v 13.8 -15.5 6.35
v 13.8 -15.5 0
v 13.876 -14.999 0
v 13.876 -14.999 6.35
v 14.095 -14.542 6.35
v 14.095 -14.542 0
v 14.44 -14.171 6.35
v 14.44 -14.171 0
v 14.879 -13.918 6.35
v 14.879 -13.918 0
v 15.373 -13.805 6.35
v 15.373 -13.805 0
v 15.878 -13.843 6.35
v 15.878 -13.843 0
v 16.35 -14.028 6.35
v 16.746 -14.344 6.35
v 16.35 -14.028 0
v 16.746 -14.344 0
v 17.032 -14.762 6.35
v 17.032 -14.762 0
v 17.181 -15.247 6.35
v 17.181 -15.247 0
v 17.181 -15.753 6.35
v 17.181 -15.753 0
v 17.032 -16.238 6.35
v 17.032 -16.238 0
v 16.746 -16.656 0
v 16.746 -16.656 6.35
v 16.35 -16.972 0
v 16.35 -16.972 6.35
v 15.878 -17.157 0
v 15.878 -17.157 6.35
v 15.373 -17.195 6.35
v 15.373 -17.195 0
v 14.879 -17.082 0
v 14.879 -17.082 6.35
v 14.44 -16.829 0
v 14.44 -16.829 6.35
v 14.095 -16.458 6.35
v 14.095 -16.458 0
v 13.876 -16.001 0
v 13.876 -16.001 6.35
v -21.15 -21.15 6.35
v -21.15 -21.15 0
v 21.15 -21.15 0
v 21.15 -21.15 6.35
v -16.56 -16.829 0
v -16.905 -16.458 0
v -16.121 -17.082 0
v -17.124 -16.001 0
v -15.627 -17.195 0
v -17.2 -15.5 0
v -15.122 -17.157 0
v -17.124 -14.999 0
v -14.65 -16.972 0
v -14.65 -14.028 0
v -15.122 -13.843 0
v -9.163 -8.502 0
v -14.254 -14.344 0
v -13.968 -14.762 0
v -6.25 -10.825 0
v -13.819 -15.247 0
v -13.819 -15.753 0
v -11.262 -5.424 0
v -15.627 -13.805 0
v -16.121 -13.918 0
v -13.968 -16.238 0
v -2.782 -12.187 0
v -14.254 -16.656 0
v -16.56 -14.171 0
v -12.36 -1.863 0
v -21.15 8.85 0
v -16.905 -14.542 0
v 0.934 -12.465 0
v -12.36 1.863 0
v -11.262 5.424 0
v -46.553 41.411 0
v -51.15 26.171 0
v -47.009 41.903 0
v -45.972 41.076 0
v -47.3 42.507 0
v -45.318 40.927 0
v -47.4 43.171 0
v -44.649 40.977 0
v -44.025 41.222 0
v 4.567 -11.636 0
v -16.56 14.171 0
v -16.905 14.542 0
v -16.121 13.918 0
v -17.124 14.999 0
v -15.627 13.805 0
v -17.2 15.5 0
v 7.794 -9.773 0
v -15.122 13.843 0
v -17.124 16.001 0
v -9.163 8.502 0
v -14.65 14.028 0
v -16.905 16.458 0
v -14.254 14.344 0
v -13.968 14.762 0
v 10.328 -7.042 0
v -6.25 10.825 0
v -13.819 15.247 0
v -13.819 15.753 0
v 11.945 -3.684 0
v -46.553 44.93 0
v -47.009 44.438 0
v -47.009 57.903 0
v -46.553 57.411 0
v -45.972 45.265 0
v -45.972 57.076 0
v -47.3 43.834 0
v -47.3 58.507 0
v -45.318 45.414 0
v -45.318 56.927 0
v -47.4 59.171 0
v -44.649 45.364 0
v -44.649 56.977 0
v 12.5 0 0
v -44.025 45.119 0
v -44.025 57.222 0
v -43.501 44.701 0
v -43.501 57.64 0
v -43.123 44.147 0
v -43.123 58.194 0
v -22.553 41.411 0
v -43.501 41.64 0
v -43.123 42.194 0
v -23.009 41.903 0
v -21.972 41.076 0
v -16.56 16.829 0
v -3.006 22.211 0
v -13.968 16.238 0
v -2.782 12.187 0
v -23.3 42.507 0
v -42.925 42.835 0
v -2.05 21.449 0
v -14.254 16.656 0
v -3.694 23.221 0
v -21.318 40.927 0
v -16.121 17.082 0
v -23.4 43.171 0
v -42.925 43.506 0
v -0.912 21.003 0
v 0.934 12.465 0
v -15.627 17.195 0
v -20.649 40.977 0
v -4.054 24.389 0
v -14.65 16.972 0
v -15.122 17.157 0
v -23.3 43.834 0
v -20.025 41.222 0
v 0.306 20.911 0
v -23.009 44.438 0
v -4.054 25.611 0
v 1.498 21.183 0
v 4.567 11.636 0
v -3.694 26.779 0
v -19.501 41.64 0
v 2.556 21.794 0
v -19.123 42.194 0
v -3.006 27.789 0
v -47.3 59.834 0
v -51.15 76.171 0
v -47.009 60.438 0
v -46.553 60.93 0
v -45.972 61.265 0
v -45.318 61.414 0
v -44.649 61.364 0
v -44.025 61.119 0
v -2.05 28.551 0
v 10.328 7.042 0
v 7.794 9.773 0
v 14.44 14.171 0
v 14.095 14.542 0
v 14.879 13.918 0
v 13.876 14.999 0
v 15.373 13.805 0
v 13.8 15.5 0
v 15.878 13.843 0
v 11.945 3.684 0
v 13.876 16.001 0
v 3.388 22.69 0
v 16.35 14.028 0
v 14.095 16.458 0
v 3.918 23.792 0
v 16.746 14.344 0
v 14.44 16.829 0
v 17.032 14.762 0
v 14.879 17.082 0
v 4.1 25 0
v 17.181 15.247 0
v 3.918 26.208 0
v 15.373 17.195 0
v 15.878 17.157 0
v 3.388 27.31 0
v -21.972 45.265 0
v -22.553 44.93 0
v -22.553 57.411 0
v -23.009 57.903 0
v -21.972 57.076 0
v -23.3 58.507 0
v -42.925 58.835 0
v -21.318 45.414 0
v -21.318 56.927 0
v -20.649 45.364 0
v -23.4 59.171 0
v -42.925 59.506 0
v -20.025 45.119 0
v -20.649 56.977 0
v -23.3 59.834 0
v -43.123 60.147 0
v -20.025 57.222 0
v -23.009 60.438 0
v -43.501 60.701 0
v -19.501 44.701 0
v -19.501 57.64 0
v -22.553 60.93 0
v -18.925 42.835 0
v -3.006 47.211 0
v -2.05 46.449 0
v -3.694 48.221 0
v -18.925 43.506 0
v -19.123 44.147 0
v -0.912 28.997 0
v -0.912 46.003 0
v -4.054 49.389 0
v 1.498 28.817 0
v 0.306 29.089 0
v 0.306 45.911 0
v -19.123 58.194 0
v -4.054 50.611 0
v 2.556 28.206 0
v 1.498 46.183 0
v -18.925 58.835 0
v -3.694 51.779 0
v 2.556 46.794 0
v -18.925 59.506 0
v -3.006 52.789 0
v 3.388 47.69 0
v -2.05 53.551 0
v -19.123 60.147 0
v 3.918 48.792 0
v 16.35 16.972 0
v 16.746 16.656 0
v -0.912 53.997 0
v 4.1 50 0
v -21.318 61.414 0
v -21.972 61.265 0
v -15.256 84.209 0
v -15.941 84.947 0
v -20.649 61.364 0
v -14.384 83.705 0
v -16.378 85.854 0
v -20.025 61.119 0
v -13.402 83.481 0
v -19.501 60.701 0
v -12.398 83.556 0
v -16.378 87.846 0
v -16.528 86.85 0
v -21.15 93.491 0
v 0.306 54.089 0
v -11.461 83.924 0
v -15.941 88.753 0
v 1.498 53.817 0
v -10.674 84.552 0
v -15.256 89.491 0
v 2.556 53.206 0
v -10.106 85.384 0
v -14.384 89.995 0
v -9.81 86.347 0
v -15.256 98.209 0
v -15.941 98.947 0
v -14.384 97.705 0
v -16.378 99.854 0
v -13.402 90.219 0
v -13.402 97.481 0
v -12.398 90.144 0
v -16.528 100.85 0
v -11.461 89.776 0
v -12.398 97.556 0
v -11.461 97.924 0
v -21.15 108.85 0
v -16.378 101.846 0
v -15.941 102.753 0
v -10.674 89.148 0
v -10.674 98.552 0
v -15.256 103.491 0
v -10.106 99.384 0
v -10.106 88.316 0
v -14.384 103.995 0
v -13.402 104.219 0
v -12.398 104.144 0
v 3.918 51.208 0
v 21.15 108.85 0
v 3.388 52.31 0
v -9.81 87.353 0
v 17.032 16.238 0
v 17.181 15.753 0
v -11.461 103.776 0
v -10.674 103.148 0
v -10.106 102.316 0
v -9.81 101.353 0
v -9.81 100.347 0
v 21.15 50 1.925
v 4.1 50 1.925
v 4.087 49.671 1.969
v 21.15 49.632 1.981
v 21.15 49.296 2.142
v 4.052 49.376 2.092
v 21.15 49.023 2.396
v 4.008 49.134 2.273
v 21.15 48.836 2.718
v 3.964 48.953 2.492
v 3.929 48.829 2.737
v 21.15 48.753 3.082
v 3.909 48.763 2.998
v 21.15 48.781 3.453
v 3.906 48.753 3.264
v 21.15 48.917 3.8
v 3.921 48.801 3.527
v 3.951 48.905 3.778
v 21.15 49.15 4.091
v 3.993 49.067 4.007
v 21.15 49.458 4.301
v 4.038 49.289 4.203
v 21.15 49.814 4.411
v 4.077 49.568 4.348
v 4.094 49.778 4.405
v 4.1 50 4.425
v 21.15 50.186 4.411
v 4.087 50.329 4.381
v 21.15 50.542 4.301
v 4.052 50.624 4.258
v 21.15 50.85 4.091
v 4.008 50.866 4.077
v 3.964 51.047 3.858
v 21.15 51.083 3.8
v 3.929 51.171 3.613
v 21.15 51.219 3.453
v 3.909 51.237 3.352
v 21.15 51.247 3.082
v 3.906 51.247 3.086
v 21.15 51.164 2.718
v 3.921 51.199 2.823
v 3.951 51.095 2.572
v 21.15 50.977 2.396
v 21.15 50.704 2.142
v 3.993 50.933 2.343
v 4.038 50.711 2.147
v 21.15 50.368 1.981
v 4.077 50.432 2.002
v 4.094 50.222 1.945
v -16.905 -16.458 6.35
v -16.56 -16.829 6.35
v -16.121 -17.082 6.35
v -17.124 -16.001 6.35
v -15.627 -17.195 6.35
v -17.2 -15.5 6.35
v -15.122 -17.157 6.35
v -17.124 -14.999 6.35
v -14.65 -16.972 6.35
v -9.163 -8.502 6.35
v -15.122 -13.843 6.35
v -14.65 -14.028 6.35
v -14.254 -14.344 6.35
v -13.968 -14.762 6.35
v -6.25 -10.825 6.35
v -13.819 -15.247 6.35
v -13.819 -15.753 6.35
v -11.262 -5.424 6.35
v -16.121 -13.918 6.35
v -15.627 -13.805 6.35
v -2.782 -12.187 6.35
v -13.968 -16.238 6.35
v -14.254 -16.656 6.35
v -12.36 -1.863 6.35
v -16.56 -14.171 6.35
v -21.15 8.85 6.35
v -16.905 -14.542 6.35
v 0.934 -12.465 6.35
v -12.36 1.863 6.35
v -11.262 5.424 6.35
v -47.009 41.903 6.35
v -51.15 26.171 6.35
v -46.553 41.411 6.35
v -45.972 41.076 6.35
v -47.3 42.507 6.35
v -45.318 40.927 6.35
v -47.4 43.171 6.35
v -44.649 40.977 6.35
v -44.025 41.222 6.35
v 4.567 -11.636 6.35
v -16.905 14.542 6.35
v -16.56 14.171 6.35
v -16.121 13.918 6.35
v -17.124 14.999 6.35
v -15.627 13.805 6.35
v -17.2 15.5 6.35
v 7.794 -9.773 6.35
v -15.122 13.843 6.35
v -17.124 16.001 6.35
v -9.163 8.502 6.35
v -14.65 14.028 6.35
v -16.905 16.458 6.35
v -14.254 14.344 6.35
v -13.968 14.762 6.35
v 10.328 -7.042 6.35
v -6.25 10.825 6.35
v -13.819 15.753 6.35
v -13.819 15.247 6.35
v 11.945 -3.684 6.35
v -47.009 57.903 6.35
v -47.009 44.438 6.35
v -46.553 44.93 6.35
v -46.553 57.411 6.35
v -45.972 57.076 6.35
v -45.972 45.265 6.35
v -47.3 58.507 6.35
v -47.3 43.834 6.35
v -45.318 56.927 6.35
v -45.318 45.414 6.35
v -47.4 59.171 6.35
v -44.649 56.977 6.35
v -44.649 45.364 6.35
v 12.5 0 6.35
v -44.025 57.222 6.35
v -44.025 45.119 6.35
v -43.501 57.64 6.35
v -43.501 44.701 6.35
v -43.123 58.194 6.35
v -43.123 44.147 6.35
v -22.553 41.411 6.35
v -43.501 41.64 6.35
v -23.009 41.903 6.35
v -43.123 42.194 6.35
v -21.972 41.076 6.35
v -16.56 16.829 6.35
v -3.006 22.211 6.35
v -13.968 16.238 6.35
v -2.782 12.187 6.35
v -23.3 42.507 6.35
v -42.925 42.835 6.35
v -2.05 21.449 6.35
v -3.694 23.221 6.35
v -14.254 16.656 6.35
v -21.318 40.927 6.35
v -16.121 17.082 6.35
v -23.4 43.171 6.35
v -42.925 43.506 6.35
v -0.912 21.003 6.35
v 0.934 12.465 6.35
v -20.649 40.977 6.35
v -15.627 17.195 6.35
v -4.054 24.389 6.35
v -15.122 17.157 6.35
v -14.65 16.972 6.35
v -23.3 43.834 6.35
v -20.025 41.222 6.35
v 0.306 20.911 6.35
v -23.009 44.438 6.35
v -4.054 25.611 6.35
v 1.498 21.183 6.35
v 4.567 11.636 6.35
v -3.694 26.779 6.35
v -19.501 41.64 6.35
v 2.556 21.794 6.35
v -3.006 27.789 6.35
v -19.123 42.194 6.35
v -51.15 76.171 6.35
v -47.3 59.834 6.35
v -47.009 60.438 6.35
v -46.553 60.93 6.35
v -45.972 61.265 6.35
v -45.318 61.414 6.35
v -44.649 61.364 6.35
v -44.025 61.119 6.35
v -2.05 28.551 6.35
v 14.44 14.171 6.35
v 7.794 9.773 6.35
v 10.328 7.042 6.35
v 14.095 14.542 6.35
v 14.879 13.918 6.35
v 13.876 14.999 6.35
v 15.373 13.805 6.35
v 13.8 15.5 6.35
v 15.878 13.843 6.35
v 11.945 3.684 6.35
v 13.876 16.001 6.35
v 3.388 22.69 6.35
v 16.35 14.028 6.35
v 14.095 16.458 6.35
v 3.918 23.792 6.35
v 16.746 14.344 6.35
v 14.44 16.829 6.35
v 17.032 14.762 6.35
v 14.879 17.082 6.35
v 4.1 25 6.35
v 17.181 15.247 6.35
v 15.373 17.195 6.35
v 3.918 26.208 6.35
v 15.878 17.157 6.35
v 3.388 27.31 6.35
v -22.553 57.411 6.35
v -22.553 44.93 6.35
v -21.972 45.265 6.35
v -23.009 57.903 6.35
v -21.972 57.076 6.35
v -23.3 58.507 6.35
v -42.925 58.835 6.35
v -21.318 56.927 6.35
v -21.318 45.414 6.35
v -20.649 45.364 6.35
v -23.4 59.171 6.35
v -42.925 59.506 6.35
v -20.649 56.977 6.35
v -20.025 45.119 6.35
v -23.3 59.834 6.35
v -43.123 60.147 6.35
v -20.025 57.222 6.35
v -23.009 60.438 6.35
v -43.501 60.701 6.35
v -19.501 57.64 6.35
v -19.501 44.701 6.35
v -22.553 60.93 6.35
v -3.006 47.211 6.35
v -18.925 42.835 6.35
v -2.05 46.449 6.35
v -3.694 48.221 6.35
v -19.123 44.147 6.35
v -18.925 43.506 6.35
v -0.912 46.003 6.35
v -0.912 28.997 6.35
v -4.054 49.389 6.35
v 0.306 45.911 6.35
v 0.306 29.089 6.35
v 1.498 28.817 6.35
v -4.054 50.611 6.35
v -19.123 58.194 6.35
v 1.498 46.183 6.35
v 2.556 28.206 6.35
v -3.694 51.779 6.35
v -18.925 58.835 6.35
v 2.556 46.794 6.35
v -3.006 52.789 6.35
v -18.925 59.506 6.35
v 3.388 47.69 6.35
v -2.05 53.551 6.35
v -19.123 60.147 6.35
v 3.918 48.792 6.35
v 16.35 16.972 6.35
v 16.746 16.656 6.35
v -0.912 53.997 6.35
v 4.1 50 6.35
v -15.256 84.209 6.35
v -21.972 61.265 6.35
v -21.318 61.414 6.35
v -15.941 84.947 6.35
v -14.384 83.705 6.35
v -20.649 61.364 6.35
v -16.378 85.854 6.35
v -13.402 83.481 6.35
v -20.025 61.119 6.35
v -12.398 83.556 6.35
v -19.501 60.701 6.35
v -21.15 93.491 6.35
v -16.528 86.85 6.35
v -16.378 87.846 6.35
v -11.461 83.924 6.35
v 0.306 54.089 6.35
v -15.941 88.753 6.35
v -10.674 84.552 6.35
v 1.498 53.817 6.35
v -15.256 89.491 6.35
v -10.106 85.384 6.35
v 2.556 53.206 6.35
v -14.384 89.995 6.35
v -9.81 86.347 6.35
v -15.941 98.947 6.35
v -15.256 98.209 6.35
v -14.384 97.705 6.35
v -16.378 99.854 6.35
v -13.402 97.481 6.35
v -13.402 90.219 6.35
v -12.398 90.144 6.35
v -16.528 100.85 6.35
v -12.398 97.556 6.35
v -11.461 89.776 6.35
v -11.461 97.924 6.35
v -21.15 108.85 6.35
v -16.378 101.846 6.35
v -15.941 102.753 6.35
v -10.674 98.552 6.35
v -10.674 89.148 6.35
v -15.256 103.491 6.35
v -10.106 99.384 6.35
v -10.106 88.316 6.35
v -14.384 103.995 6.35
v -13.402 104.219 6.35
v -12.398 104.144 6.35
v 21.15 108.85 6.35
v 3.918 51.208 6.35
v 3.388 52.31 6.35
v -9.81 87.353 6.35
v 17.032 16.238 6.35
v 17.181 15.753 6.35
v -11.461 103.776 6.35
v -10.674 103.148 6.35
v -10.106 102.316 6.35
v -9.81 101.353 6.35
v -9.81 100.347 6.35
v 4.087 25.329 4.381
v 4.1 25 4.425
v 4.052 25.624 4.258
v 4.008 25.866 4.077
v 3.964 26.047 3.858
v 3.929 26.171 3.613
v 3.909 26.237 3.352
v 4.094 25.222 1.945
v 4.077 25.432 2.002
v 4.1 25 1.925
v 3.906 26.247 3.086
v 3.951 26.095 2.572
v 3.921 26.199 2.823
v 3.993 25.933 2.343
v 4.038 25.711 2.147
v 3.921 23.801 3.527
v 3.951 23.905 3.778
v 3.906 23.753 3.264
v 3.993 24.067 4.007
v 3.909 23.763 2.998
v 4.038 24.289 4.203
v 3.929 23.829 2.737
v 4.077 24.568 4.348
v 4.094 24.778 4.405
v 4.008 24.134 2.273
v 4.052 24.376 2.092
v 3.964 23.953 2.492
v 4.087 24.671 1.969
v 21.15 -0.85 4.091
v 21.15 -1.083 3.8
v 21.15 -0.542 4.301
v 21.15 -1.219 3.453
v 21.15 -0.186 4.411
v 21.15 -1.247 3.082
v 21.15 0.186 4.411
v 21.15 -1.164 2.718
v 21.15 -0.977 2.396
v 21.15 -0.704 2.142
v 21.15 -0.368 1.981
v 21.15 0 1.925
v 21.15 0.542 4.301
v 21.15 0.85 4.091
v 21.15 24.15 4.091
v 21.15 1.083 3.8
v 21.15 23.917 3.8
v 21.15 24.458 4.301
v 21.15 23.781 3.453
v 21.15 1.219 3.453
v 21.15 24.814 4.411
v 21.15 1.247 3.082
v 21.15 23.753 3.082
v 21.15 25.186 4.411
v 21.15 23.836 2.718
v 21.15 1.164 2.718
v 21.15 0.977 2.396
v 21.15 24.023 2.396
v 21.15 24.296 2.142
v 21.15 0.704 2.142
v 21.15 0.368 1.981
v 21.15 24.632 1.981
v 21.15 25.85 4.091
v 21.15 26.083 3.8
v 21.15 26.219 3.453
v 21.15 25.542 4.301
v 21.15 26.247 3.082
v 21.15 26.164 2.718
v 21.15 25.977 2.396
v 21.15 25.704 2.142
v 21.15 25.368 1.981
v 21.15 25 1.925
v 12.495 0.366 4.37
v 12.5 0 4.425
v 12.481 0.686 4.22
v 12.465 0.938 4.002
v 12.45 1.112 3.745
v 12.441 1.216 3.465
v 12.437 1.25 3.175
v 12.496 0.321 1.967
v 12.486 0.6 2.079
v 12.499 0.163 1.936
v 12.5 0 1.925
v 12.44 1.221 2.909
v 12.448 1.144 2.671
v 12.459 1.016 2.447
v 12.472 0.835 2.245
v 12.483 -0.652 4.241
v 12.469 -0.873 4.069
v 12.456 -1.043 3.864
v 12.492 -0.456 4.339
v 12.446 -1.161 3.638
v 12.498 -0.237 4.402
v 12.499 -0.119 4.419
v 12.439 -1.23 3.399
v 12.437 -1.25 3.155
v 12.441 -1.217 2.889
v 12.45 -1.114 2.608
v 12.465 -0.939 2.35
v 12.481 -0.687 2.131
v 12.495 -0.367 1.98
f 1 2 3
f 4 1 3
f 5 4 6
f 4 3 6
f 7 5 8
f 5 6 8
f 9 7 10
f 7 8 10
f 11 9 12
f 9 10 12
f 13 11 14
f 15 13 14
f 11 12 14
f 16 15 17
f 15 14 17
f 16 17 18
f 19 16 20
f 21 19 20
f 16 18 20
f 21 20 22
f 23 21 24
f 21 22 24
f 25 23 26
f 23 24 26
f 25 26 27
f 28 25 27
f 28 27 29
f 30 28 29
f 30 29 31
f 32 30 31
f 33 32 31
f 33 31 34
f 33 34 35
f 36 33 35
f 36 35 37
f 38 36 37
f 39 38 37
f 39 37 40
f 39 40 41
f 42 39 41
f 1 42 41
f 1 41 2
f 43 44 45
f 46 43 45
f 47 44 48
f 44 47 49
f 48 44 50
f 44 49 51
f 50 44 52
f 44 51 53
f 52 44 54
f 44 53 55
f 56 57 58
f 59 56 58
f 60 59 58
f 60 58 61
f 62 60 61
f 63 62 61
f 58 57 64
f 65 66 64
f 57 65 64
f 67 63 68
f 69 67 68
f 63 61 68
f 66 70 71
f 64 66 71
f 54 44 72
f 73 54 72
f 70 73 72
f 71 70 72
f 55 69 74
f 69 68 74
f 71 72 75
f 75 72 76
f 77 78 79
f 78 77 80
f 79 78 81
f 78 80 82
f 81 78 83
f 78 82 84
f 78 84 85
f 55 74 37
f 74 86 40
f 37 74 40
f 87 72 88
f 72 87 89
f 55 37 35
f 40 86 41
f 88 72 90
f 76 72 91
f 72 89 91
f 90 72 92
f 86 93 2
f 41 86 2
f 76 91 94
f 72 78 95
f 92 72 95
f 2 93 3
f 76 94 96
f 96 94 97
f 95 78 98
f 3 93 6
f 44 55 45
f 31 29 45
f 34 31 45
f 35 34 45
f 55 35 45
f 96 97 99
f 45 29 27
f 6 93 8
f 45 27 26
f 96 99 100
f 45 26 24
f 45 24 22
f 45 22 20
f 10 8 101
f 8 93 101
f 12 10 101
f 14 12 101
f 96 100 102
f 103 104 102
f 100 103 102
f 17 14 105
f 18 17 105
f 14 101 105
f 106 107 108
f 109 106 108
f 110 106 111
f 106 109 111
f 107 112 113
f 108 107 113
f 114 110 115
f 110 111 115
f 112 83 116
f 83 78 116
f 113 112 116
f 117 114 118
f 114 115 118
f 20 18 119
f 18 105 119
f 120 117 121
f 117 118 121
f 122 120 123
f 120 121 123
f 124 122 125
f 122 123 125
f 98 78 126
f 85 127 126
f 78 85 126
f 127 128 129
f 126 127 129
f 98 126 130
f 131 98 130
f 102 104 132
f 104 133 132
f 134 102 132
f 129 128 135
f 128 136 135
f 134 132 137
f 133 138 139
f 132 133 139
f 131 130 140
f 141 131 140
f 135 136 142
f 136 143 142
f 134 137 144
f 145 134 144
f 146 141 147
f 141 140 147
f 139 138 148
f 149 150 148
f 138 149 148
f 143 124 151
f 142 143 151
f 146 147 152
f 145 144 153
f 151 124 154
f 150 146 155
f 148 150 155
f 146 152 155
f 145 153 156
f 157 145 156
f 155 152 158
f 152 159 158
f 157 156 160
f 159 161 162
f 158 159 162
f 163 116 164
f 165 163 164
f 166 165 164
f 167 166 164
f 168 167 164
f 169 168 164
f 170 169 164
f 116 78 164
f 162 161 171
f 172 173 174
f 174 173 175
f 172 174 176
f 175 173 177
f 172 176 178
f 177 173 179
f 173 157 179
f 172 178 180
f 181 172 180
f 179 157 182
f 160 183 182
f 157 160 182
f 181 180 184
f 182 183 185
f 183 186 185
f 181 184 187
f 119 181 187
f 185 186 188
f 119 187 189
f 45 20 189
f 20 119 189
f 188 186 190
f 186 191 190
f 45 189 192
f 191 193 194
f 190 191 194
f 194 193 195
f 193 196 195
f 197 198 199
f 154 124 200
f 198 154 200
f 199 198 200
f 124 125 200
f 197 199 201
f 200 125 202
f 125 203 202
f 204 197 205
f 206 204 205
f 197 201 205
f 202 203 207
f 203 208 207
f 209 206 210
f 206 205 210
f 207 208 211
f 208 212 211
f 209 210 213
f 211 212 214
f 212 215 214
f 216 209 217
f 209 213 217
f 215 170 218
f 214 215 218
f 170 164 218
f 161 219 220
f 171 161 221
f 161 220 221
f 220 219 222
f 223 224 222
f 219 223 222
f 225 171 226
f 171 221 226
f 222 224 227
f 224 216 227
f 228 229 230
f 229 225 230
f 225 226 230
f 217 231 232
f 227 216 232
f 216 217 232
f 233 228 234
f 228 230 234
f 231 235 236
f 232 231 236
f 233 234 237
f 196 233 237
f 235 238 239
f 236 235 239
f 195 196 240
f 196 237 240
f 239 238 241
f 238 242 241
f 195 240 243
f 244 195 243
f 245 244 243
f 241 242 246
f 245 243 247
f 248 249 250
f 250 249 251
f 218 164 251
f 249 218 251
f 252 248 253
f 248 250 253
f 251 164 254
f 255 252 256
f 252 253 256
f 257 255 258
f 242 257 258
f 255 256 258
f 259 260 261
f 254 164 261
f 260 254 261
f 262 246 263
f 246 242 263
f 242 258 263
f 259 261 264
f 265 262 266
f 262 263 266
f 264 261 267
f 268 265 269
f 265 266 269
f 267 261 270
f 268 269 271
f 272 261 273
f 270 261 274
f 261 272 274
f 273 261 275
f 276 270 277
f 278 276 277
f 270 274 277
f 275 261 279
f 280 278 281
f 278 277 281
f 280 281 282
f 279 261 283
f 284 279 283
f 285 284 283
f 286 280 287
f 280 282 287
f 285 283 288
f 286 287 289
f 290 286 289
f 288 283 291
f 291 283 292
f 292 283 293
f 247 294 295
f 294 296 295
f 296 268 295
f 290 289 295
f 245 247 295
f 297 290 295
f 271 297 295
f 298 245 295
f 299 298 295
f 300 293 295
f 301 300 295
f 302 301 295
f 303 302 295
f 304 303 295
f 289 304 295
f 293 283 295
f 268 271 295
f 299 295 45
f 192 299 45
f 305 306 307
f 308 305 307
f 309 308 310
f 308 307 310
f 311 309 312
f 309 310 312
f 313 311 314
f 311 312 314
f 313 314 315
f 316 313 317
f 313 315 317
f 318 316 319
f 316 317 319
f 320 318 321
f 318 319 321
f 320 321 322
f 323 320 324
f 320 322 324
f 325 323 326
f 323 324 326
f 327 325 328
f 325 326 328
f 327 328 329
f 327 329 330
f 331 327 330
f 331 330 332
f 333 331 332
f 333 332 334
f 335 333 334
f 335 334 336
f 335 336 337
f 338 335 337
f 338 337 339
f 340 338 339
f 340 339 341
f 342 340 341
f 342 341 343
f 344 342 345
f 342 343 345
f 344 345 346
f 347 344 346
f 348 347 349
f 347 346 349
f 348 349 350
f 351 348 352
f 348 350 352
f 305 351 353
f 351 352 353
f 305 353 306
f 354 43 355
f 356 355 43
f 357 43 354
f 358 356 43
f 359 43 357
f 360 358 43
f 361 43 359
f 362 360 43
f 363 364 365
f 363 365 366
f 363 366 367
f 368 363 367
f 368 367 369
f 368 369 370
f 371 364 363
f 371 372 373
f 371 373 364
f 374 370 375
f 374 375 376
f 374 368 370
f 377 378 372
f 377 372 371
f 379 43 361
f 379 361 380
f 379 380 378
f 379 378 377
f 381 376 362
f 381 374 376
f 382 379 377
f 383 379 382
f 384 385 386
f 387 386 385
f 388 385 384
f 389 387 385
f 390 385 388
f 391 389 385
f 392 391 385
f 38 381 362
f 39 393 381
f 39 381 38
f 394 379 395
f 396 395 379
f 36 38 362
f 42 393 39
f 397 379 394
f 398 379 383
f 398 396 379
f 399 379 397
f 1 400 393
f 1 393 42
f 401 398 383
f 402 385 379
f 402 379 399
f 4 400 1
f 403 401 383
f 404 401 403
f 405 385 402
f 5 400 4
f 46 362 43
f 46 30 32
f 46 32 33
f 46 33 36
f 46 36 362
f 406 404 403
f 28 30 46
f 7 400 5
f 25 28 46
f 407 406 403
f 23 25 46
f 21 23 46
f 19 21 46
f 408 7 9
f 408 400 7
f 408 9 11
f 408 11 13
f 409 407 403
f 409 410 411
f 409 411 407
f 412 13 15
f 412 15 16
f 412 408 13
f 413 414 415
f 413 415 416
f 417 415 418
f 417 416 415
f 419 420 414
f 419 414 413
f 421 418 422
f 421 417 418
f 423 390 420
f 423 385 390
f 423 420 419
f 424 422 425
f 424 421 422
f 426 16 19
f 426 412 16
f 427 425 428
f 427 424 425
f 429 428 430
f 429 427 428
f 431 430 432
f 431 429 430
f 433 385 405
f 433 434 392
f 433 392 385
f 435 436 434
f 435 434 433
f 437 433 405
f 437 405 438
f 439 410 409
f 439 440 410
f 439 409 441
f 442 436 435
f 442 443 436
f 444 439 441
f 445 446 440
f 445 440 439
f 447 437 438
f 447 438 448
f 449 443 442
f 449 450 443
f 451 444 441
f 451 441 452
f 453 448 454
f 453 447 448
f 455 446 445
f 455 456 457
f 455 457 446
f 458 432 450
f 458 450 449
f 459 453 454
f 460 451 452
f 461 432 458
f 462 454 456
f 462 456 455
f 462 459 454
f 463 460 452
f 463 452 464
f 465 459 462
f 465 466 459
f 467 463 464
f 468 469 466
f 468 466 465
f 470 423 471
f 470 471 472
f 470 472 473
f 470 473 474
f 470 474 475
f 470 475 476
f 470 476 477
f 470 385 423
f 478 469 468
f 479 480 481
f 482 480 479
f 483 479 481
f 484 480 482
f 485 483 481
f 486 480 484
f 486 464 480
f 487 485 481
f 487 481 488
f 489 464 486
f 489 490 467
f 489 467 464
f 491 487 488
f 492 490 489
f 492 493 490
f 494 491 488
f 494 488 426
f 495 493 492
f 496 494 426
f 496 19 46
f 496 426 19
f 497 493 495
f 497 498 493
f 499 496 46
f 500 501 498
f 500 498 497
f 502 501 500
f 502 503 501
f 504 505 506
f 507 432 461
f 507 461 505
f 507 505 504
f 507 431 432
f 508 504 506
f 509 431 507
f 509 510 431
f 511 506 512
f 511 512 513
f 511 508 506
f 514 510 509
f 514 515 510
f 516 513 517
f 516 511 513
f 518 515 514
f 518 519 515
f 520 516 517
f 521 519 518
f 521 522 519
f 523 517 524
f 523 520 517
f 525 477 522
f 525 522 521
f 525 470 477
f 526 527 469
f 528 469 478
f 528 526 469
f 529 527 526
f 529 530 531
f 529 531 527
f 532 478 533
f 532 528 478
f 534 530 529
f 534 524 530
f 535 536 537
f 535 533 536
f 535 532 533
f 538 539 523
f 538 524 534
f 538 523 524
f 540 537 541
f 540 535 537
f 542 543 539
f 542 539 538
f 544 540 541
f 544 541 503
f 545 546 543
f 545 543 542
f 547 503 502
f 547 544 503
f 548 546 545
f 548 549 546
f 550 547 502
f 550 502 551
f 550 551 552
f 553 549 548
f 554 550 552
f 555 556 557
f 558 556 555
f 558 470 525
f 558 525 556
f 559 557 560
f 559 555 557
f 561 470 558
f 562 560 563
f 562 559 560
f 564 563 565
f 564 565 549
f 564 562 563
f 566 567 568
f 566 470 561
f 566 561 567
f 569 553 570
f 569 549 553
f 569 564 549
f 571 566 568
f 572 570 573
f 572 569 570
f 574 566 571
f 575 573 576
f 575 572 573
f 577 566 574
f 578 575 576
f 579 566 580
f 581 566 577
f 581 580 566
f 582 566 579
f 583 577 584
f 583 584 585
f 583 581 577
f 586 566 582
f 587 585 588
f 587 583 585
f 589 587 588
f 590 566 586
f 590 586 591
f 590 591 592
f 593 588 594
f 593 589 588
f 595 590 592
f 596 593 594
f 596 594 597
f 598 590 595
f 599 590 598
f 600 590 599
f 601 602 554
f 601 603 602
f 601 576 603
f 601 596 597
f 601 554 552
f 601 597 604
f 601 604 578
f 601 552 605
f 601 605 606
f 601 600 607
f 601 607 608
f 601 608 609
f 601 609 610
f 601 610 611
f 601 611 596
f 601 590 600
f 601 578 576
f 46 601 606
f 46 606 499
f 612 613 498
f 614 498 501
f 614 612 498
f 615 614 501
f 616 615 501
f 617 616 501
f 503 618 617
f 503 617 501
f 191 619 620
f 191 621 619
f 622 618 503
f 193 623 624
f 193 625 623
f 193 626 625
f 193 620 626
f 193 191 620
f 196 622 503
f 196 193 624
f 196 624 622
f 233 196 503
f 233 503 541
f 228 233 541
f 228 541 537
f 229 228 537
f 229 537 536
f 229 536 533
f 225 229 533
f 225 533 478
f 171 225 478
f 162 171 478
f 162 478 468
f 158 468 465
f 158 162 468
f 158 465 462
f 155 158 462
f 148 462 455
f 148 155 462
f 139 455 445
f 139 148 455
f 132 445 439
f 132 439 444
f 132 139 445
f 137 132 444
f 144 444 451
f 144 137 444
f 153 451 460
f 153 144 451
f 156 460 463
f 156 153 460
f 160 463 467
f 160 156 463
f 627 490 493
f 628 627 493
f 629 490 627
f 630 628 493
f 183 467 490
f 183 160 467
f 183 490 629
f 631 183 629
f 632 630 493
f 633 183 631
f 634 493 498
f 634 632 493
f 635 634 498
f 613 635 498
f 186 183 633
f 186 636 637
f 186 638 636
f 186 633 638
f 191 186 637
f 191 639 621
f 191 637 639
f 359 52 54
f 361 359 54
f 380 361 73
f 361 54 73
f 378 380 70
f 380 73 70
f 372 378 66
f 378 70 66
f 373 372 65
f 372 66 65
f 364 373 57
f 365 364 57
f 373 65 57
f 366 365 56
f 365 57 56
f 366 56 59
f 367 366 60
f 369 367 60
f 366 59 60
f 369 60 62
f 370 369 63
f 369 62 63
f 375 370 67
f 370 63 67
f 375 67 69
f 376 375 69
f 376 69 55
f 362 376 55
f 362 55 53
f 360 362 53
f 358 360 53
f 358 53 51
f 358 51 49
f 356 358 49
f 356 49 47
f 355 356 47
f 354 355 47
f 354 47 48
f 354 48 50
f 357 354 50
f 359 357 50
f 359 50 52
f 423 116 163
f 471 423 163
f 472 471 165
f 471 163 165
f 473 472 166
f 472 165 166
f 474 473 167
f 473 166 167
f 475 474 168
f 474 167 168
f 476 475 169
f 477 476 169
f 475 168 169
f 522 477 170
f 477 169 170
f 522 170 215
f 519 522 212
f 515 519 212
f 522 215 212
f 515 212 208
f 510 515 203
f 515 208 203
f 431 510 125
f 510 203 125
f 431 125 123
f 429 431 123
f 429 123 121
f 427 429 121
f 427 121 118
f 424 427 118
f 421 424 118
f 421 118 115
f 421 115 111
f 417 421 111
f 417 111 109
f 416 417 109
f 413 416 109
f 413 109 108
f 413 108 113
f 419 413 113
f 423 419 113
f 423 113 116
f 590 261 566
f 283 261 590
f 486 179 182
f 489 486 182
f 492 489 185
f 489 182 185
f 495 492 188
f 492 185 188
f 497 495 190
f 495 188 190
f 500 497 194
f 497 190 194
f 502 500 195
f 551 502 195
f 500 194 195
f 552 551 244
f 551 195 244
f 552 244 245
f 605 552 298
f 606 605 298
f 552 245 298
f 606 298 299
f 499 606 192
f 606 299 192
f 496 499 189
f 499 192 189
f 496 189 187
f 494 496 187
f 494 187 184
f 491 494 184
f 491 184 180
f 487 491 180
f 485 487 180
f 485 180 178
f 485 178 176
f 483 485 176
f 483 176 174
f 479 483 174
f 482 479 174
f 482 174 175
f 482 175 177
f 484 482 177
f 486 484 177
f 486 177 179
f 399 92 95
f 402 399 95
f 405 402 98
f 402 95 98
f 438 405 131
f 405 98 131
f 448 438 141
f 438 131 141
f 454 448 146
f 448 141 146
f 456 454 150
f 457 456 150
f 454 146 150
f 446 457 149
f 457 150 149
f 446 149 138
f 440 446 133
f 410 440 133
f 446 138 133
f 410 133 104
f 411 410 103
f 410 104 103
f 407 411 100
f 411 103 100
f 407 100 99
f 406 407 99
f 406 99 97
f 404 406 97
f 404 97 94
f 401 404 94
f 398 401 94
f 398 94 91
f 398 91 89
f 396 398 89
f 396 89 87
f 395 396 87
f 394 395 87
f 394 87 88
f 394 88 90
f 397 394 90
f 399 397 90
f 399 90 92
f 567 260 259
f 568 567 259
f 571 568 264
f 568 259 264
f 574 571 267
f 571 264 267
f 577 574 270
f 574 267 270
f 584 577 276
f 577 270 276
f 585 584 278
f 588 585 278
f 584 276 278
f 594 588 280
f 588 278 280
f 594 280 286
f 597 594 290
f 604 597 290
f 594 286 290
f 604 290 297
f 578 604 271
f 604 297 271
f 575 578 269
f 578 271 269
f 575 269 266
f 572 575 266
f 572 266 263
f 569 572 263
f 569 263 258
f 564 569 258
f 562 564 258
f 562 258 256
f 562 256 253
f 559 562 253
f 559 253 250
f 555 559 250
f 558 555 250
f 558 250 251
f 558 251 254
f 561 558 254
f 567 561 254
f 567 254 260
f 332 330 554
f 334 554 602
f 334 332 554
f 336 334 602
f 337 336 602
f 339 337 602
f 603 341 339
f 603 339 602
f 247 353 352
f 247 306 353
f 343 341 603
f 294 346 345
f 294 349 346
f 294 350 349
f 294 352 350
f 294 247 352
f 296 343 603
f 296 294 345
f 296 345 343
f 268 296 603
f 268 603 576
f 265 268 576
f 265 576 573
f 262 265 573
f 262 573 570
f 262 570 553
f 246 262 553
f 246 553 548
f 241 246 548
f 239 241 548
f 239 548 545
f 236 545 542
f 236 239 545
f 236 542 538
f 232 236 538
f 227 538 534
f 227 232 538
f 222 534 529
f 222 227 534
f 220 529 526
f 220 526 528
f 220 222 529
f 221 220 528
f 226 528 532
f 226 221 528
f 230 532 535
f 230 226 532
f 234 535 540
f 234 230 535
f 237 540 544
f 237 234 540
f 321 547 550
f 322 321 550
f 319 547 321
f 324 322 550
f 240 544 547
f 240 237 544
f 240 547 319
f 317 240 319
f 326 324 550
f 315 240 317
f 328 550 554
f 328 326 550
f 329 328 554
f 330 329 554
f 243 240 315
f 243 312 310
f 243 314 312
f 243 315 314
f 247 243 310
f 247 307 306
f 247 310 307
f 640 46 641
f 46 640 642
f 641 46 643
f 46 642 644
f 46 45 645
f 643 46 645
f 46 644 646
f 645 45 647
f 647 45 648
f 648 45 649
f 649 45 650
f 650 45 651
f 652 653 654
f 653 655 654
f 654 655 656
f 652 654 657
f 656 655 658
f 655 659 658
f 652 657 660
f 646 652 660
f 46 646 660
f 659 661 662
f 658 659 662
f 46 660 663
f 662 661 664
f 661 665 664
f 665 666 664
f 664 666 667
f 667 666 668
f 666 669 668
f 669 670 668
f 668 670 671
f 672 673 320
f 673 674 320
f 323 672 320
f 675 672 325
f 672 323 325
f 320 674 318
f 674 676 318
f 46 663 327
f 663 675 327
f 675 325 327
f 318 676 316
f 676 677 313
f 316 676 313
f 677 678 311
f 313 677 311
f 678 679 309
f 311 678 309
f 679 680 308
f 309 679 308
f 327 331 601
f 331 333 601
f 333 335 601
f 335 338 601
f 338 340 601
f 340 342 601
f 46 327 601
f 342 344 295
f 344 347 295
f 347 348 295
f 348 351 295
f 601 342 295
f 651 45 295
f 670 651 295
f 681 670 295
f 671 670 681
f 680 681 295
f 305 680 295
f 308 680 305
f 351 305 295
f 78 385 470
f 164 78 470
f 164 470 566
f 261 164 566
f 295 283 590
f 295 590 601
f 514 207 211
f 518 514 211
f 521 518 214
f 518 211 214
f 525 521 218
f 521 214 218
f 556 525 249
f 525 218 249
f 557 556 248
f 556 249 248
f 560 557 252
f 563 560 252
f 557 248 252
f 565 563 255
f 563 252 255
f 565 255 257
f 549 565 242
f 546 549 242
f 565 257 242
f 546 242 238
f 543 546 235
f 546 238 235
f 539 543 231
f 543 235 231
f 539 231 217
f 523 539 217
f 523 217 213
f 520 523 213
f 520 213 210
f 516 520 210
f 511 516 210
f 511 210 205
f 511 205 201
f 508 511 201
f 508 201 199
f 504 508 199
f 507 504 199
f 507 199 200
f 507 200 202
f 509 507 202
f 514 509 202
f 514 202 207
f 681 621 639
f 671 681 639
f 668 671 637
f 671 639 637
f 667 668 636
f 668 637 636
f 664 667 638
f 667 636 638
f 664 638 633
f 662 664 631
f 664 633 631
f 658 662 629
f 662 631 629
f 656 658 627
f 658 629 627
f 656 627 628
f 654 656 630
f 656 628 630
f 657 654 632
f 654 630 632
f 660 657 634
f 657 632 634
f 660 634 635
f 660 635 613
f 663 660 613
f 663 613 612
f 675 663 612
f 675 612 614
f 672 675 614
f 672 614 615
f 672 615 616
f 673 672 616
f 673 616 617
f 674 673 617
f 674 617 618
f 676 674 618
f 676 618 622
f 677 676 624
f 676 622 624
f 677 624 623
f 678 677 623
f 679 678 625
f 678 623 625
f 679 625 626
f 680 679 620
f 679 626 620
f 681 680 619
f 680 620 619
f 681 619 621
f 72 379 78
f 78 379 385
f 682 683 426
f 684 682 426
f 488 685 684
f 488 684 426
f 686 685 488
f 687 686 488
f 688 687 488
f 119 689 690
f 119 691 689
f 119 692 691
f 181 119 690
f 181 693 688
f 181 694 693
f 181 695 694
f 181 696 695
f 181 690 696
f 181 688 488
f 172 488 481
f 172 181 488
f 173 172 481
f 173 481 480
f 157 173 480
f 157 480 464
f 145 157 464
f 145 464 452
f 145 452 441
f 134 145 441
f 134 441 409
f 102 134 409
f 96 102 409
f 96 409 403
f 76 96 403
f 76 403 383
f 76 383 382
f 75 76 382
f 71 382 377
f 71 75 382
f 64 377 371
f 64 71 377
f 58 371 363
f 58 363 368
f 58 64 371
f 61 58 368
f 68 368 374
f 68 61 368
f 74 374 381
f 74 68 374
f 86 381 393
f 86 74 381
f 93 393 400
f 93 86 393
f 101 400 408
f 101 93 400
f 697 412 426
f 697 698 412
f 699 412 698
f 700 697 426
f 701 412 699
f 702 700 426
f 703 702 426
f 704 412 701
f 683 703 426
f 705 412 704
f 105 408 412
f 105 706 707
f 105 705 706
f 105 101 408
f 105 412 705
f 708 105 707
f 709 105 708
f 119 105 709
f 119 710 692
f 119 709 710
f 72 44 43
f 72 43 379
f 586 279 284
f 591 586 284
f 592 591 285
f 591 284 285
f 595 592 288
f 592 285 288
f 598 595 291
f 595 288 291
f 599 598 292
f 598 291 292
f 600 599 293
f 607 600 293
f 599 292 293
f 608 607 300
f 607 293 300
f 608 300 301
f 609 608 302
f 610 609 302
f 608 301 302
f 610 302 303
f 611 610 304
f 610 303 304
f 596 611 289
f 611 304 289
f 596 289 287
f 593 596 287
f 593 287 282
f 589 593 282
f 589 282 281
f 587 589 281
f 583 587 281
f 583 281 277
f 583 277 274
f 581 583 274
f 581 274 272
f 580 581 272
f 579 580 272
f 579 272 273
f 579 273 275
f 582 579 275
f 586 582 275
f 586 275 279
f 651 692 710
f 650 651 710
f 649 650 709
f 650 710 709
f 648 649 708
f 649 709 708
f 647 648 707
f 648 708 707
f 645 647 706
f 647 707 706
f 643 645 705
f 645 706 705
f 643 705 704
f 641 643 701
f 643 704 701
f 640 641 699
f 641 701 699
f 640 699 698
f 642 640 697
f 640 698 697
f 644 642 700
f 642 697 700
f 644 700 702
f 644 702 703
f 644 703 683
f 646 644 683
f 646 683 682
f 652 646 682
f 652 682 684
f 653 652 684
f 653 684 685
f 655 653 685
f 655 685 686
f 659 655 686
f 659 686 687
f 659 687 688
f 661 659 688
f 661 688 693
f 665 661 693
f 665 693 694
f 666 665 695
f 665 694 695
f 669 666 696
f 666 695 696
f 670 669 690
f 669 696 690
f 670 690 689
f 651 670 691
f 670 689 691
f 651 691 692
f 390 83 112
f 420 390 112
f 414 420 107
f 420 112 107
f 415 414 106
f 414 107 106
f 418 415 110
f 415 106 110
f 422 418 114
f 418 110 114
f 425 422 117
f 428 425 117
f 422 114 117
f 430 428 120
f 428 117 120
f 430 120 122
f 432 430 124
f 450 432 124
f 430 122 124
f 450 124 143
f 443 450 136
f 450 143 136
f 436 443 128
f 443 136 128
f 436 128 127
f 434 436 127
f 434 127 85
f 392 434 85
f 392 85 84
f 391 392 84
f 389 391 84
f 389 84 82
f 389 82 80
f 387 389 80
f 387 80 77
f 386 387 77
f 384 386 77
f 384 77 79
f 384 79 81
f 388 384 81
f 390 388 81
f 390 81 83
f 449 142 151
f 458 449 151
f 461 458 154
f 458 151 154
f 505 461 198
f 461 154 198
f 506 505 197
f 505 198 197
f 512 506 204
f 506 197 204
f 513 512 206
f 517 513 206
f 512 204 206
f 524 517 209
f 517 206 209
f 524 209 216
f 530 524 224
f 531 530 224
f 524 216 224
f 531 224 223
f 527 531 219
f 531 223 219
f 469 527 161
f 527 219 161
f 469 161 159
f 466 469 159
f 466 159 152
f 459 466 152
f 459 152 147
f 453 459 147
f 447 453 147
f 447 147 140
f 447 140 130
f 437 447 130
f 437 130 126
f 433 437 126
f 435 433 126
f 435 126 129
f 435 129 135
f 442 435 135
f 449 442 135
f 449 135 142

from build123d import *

# Parameters (mm, degrees)
SKETCH2_W                       = 42.3
SKETCH2_H                       = 130
SKETCH2_R                       = 12.5
SKETCH2_R_2                     = 4.1
BOSS_EXTRUDE1_DEPTH             = 6.35
TAP_DRILL_FOR_M3X0_5_TAP1_D     = 2.5
TAP_DRILL_FOR_M3X0_5_TAP1_DEPTH = 21.15
TAP_DRILL_FOR_M3X0_5_TAP1_TIP   = 0.751075774
M3_CLEARANCE_HOLE1_D            = 3.4
F_1_4_CLEARANCE_HOLE1_D         = 6.7564
BOSS_EXTRUDE2_DEPTH             = 6.35
M4_CLEARANCE_HOLE1_D            = 4.5


with BuildPart() as part:
    # Sketch2 → Boss-Extrude1 (new body)
    with BuildSketch(Plane.XY):
        with Locations((0, 43.85)):
            Rectangle(SKETCH2_W, SKETCH2_H)
        Circle(SKETCH2_R, mode=Mode.SUBTRACT)
        with Locations((0, 25)):
            Circle(SKETCH2_R_2, mode=Mode.SUBTRACT)
        with Locations((0, 50)):
            Circle(SKETCH2_R_2, mode=Mode.SUBTRACT)
    extrude(amount=BOSS_EXTRUDE1_DEPTH)

    # Tap Drill for M3x0.5 Tap1
    with Locations(Plane(origin=(21.15, 0, 0), x_dir=(0, 0, 1), z_dir=(1, 0, 0))):
        with Locations((3.175, -50), (3.175, 0), (3.175, -25)):
            Hole(TAP_DRILL_FOR_M3X0_5_TAP1_D / 2, depth=TAP_DRILL_FOR_M3X0_5_TAP1_DEPTH)
            with Locations((0, 0, -(TAP_DRILL_FOR_M3X0_5_TAP1_DEPTH + TAP_DRILL_FOR_M3X0_5_TAP1_TIP / 2))):  # 118° drill point
                Cone(0, TAP_DRILL_FOR_M3X0_5_TAP1_D / 2, TAP_DRILL_FOR_M3X0_5_TAP1_TIP, mode=Mode.SUBTRACT)

    # M3 Clearance Hole1 (through all)
    with Locations(Plane.XY.offset(6.35)):
        with Locations((-15.5, 15.5), (-15.5, -15.5), (15.5, -15.5), (15.5, 15.5)):
            Hole(M3_CLEARANCE_HOLE1_D / 2)

    # 1/4 Clearance Hole1 (through all)
    with Locations(Plane.XY.offset(6.35)):
        with Locations((-13.15, 86.85), (-13.15, 100.85)):
            Hole(F_1_4_CLEARANCE_HOLE1_D / 2)

    # Sketch13 → Boss-Extrude2 (add)
    with BuildSketch(Plane.XY.offset(6.35)):
        Polygon((-21.15, 8.85), (-51.15, 26.170508076), (-51.15, 76.170508076), (-21.15, 93.491016151), align=None)
    extrude(amount=-BOSS_EXTRUDE2_DEPTH)

    # M4 Clearance Hole1 (through all)
    with Locations(Plane.XY.offset(6.35)):
        with Locations((-45.15, 59.170508076), (-21.15, 59.170508076), (-21.15, 43.170508076), (-45.15, 43.170508076)):
            Hole(M4_CLEARANCE_HOLE1_D / 2)


solid = part.part
